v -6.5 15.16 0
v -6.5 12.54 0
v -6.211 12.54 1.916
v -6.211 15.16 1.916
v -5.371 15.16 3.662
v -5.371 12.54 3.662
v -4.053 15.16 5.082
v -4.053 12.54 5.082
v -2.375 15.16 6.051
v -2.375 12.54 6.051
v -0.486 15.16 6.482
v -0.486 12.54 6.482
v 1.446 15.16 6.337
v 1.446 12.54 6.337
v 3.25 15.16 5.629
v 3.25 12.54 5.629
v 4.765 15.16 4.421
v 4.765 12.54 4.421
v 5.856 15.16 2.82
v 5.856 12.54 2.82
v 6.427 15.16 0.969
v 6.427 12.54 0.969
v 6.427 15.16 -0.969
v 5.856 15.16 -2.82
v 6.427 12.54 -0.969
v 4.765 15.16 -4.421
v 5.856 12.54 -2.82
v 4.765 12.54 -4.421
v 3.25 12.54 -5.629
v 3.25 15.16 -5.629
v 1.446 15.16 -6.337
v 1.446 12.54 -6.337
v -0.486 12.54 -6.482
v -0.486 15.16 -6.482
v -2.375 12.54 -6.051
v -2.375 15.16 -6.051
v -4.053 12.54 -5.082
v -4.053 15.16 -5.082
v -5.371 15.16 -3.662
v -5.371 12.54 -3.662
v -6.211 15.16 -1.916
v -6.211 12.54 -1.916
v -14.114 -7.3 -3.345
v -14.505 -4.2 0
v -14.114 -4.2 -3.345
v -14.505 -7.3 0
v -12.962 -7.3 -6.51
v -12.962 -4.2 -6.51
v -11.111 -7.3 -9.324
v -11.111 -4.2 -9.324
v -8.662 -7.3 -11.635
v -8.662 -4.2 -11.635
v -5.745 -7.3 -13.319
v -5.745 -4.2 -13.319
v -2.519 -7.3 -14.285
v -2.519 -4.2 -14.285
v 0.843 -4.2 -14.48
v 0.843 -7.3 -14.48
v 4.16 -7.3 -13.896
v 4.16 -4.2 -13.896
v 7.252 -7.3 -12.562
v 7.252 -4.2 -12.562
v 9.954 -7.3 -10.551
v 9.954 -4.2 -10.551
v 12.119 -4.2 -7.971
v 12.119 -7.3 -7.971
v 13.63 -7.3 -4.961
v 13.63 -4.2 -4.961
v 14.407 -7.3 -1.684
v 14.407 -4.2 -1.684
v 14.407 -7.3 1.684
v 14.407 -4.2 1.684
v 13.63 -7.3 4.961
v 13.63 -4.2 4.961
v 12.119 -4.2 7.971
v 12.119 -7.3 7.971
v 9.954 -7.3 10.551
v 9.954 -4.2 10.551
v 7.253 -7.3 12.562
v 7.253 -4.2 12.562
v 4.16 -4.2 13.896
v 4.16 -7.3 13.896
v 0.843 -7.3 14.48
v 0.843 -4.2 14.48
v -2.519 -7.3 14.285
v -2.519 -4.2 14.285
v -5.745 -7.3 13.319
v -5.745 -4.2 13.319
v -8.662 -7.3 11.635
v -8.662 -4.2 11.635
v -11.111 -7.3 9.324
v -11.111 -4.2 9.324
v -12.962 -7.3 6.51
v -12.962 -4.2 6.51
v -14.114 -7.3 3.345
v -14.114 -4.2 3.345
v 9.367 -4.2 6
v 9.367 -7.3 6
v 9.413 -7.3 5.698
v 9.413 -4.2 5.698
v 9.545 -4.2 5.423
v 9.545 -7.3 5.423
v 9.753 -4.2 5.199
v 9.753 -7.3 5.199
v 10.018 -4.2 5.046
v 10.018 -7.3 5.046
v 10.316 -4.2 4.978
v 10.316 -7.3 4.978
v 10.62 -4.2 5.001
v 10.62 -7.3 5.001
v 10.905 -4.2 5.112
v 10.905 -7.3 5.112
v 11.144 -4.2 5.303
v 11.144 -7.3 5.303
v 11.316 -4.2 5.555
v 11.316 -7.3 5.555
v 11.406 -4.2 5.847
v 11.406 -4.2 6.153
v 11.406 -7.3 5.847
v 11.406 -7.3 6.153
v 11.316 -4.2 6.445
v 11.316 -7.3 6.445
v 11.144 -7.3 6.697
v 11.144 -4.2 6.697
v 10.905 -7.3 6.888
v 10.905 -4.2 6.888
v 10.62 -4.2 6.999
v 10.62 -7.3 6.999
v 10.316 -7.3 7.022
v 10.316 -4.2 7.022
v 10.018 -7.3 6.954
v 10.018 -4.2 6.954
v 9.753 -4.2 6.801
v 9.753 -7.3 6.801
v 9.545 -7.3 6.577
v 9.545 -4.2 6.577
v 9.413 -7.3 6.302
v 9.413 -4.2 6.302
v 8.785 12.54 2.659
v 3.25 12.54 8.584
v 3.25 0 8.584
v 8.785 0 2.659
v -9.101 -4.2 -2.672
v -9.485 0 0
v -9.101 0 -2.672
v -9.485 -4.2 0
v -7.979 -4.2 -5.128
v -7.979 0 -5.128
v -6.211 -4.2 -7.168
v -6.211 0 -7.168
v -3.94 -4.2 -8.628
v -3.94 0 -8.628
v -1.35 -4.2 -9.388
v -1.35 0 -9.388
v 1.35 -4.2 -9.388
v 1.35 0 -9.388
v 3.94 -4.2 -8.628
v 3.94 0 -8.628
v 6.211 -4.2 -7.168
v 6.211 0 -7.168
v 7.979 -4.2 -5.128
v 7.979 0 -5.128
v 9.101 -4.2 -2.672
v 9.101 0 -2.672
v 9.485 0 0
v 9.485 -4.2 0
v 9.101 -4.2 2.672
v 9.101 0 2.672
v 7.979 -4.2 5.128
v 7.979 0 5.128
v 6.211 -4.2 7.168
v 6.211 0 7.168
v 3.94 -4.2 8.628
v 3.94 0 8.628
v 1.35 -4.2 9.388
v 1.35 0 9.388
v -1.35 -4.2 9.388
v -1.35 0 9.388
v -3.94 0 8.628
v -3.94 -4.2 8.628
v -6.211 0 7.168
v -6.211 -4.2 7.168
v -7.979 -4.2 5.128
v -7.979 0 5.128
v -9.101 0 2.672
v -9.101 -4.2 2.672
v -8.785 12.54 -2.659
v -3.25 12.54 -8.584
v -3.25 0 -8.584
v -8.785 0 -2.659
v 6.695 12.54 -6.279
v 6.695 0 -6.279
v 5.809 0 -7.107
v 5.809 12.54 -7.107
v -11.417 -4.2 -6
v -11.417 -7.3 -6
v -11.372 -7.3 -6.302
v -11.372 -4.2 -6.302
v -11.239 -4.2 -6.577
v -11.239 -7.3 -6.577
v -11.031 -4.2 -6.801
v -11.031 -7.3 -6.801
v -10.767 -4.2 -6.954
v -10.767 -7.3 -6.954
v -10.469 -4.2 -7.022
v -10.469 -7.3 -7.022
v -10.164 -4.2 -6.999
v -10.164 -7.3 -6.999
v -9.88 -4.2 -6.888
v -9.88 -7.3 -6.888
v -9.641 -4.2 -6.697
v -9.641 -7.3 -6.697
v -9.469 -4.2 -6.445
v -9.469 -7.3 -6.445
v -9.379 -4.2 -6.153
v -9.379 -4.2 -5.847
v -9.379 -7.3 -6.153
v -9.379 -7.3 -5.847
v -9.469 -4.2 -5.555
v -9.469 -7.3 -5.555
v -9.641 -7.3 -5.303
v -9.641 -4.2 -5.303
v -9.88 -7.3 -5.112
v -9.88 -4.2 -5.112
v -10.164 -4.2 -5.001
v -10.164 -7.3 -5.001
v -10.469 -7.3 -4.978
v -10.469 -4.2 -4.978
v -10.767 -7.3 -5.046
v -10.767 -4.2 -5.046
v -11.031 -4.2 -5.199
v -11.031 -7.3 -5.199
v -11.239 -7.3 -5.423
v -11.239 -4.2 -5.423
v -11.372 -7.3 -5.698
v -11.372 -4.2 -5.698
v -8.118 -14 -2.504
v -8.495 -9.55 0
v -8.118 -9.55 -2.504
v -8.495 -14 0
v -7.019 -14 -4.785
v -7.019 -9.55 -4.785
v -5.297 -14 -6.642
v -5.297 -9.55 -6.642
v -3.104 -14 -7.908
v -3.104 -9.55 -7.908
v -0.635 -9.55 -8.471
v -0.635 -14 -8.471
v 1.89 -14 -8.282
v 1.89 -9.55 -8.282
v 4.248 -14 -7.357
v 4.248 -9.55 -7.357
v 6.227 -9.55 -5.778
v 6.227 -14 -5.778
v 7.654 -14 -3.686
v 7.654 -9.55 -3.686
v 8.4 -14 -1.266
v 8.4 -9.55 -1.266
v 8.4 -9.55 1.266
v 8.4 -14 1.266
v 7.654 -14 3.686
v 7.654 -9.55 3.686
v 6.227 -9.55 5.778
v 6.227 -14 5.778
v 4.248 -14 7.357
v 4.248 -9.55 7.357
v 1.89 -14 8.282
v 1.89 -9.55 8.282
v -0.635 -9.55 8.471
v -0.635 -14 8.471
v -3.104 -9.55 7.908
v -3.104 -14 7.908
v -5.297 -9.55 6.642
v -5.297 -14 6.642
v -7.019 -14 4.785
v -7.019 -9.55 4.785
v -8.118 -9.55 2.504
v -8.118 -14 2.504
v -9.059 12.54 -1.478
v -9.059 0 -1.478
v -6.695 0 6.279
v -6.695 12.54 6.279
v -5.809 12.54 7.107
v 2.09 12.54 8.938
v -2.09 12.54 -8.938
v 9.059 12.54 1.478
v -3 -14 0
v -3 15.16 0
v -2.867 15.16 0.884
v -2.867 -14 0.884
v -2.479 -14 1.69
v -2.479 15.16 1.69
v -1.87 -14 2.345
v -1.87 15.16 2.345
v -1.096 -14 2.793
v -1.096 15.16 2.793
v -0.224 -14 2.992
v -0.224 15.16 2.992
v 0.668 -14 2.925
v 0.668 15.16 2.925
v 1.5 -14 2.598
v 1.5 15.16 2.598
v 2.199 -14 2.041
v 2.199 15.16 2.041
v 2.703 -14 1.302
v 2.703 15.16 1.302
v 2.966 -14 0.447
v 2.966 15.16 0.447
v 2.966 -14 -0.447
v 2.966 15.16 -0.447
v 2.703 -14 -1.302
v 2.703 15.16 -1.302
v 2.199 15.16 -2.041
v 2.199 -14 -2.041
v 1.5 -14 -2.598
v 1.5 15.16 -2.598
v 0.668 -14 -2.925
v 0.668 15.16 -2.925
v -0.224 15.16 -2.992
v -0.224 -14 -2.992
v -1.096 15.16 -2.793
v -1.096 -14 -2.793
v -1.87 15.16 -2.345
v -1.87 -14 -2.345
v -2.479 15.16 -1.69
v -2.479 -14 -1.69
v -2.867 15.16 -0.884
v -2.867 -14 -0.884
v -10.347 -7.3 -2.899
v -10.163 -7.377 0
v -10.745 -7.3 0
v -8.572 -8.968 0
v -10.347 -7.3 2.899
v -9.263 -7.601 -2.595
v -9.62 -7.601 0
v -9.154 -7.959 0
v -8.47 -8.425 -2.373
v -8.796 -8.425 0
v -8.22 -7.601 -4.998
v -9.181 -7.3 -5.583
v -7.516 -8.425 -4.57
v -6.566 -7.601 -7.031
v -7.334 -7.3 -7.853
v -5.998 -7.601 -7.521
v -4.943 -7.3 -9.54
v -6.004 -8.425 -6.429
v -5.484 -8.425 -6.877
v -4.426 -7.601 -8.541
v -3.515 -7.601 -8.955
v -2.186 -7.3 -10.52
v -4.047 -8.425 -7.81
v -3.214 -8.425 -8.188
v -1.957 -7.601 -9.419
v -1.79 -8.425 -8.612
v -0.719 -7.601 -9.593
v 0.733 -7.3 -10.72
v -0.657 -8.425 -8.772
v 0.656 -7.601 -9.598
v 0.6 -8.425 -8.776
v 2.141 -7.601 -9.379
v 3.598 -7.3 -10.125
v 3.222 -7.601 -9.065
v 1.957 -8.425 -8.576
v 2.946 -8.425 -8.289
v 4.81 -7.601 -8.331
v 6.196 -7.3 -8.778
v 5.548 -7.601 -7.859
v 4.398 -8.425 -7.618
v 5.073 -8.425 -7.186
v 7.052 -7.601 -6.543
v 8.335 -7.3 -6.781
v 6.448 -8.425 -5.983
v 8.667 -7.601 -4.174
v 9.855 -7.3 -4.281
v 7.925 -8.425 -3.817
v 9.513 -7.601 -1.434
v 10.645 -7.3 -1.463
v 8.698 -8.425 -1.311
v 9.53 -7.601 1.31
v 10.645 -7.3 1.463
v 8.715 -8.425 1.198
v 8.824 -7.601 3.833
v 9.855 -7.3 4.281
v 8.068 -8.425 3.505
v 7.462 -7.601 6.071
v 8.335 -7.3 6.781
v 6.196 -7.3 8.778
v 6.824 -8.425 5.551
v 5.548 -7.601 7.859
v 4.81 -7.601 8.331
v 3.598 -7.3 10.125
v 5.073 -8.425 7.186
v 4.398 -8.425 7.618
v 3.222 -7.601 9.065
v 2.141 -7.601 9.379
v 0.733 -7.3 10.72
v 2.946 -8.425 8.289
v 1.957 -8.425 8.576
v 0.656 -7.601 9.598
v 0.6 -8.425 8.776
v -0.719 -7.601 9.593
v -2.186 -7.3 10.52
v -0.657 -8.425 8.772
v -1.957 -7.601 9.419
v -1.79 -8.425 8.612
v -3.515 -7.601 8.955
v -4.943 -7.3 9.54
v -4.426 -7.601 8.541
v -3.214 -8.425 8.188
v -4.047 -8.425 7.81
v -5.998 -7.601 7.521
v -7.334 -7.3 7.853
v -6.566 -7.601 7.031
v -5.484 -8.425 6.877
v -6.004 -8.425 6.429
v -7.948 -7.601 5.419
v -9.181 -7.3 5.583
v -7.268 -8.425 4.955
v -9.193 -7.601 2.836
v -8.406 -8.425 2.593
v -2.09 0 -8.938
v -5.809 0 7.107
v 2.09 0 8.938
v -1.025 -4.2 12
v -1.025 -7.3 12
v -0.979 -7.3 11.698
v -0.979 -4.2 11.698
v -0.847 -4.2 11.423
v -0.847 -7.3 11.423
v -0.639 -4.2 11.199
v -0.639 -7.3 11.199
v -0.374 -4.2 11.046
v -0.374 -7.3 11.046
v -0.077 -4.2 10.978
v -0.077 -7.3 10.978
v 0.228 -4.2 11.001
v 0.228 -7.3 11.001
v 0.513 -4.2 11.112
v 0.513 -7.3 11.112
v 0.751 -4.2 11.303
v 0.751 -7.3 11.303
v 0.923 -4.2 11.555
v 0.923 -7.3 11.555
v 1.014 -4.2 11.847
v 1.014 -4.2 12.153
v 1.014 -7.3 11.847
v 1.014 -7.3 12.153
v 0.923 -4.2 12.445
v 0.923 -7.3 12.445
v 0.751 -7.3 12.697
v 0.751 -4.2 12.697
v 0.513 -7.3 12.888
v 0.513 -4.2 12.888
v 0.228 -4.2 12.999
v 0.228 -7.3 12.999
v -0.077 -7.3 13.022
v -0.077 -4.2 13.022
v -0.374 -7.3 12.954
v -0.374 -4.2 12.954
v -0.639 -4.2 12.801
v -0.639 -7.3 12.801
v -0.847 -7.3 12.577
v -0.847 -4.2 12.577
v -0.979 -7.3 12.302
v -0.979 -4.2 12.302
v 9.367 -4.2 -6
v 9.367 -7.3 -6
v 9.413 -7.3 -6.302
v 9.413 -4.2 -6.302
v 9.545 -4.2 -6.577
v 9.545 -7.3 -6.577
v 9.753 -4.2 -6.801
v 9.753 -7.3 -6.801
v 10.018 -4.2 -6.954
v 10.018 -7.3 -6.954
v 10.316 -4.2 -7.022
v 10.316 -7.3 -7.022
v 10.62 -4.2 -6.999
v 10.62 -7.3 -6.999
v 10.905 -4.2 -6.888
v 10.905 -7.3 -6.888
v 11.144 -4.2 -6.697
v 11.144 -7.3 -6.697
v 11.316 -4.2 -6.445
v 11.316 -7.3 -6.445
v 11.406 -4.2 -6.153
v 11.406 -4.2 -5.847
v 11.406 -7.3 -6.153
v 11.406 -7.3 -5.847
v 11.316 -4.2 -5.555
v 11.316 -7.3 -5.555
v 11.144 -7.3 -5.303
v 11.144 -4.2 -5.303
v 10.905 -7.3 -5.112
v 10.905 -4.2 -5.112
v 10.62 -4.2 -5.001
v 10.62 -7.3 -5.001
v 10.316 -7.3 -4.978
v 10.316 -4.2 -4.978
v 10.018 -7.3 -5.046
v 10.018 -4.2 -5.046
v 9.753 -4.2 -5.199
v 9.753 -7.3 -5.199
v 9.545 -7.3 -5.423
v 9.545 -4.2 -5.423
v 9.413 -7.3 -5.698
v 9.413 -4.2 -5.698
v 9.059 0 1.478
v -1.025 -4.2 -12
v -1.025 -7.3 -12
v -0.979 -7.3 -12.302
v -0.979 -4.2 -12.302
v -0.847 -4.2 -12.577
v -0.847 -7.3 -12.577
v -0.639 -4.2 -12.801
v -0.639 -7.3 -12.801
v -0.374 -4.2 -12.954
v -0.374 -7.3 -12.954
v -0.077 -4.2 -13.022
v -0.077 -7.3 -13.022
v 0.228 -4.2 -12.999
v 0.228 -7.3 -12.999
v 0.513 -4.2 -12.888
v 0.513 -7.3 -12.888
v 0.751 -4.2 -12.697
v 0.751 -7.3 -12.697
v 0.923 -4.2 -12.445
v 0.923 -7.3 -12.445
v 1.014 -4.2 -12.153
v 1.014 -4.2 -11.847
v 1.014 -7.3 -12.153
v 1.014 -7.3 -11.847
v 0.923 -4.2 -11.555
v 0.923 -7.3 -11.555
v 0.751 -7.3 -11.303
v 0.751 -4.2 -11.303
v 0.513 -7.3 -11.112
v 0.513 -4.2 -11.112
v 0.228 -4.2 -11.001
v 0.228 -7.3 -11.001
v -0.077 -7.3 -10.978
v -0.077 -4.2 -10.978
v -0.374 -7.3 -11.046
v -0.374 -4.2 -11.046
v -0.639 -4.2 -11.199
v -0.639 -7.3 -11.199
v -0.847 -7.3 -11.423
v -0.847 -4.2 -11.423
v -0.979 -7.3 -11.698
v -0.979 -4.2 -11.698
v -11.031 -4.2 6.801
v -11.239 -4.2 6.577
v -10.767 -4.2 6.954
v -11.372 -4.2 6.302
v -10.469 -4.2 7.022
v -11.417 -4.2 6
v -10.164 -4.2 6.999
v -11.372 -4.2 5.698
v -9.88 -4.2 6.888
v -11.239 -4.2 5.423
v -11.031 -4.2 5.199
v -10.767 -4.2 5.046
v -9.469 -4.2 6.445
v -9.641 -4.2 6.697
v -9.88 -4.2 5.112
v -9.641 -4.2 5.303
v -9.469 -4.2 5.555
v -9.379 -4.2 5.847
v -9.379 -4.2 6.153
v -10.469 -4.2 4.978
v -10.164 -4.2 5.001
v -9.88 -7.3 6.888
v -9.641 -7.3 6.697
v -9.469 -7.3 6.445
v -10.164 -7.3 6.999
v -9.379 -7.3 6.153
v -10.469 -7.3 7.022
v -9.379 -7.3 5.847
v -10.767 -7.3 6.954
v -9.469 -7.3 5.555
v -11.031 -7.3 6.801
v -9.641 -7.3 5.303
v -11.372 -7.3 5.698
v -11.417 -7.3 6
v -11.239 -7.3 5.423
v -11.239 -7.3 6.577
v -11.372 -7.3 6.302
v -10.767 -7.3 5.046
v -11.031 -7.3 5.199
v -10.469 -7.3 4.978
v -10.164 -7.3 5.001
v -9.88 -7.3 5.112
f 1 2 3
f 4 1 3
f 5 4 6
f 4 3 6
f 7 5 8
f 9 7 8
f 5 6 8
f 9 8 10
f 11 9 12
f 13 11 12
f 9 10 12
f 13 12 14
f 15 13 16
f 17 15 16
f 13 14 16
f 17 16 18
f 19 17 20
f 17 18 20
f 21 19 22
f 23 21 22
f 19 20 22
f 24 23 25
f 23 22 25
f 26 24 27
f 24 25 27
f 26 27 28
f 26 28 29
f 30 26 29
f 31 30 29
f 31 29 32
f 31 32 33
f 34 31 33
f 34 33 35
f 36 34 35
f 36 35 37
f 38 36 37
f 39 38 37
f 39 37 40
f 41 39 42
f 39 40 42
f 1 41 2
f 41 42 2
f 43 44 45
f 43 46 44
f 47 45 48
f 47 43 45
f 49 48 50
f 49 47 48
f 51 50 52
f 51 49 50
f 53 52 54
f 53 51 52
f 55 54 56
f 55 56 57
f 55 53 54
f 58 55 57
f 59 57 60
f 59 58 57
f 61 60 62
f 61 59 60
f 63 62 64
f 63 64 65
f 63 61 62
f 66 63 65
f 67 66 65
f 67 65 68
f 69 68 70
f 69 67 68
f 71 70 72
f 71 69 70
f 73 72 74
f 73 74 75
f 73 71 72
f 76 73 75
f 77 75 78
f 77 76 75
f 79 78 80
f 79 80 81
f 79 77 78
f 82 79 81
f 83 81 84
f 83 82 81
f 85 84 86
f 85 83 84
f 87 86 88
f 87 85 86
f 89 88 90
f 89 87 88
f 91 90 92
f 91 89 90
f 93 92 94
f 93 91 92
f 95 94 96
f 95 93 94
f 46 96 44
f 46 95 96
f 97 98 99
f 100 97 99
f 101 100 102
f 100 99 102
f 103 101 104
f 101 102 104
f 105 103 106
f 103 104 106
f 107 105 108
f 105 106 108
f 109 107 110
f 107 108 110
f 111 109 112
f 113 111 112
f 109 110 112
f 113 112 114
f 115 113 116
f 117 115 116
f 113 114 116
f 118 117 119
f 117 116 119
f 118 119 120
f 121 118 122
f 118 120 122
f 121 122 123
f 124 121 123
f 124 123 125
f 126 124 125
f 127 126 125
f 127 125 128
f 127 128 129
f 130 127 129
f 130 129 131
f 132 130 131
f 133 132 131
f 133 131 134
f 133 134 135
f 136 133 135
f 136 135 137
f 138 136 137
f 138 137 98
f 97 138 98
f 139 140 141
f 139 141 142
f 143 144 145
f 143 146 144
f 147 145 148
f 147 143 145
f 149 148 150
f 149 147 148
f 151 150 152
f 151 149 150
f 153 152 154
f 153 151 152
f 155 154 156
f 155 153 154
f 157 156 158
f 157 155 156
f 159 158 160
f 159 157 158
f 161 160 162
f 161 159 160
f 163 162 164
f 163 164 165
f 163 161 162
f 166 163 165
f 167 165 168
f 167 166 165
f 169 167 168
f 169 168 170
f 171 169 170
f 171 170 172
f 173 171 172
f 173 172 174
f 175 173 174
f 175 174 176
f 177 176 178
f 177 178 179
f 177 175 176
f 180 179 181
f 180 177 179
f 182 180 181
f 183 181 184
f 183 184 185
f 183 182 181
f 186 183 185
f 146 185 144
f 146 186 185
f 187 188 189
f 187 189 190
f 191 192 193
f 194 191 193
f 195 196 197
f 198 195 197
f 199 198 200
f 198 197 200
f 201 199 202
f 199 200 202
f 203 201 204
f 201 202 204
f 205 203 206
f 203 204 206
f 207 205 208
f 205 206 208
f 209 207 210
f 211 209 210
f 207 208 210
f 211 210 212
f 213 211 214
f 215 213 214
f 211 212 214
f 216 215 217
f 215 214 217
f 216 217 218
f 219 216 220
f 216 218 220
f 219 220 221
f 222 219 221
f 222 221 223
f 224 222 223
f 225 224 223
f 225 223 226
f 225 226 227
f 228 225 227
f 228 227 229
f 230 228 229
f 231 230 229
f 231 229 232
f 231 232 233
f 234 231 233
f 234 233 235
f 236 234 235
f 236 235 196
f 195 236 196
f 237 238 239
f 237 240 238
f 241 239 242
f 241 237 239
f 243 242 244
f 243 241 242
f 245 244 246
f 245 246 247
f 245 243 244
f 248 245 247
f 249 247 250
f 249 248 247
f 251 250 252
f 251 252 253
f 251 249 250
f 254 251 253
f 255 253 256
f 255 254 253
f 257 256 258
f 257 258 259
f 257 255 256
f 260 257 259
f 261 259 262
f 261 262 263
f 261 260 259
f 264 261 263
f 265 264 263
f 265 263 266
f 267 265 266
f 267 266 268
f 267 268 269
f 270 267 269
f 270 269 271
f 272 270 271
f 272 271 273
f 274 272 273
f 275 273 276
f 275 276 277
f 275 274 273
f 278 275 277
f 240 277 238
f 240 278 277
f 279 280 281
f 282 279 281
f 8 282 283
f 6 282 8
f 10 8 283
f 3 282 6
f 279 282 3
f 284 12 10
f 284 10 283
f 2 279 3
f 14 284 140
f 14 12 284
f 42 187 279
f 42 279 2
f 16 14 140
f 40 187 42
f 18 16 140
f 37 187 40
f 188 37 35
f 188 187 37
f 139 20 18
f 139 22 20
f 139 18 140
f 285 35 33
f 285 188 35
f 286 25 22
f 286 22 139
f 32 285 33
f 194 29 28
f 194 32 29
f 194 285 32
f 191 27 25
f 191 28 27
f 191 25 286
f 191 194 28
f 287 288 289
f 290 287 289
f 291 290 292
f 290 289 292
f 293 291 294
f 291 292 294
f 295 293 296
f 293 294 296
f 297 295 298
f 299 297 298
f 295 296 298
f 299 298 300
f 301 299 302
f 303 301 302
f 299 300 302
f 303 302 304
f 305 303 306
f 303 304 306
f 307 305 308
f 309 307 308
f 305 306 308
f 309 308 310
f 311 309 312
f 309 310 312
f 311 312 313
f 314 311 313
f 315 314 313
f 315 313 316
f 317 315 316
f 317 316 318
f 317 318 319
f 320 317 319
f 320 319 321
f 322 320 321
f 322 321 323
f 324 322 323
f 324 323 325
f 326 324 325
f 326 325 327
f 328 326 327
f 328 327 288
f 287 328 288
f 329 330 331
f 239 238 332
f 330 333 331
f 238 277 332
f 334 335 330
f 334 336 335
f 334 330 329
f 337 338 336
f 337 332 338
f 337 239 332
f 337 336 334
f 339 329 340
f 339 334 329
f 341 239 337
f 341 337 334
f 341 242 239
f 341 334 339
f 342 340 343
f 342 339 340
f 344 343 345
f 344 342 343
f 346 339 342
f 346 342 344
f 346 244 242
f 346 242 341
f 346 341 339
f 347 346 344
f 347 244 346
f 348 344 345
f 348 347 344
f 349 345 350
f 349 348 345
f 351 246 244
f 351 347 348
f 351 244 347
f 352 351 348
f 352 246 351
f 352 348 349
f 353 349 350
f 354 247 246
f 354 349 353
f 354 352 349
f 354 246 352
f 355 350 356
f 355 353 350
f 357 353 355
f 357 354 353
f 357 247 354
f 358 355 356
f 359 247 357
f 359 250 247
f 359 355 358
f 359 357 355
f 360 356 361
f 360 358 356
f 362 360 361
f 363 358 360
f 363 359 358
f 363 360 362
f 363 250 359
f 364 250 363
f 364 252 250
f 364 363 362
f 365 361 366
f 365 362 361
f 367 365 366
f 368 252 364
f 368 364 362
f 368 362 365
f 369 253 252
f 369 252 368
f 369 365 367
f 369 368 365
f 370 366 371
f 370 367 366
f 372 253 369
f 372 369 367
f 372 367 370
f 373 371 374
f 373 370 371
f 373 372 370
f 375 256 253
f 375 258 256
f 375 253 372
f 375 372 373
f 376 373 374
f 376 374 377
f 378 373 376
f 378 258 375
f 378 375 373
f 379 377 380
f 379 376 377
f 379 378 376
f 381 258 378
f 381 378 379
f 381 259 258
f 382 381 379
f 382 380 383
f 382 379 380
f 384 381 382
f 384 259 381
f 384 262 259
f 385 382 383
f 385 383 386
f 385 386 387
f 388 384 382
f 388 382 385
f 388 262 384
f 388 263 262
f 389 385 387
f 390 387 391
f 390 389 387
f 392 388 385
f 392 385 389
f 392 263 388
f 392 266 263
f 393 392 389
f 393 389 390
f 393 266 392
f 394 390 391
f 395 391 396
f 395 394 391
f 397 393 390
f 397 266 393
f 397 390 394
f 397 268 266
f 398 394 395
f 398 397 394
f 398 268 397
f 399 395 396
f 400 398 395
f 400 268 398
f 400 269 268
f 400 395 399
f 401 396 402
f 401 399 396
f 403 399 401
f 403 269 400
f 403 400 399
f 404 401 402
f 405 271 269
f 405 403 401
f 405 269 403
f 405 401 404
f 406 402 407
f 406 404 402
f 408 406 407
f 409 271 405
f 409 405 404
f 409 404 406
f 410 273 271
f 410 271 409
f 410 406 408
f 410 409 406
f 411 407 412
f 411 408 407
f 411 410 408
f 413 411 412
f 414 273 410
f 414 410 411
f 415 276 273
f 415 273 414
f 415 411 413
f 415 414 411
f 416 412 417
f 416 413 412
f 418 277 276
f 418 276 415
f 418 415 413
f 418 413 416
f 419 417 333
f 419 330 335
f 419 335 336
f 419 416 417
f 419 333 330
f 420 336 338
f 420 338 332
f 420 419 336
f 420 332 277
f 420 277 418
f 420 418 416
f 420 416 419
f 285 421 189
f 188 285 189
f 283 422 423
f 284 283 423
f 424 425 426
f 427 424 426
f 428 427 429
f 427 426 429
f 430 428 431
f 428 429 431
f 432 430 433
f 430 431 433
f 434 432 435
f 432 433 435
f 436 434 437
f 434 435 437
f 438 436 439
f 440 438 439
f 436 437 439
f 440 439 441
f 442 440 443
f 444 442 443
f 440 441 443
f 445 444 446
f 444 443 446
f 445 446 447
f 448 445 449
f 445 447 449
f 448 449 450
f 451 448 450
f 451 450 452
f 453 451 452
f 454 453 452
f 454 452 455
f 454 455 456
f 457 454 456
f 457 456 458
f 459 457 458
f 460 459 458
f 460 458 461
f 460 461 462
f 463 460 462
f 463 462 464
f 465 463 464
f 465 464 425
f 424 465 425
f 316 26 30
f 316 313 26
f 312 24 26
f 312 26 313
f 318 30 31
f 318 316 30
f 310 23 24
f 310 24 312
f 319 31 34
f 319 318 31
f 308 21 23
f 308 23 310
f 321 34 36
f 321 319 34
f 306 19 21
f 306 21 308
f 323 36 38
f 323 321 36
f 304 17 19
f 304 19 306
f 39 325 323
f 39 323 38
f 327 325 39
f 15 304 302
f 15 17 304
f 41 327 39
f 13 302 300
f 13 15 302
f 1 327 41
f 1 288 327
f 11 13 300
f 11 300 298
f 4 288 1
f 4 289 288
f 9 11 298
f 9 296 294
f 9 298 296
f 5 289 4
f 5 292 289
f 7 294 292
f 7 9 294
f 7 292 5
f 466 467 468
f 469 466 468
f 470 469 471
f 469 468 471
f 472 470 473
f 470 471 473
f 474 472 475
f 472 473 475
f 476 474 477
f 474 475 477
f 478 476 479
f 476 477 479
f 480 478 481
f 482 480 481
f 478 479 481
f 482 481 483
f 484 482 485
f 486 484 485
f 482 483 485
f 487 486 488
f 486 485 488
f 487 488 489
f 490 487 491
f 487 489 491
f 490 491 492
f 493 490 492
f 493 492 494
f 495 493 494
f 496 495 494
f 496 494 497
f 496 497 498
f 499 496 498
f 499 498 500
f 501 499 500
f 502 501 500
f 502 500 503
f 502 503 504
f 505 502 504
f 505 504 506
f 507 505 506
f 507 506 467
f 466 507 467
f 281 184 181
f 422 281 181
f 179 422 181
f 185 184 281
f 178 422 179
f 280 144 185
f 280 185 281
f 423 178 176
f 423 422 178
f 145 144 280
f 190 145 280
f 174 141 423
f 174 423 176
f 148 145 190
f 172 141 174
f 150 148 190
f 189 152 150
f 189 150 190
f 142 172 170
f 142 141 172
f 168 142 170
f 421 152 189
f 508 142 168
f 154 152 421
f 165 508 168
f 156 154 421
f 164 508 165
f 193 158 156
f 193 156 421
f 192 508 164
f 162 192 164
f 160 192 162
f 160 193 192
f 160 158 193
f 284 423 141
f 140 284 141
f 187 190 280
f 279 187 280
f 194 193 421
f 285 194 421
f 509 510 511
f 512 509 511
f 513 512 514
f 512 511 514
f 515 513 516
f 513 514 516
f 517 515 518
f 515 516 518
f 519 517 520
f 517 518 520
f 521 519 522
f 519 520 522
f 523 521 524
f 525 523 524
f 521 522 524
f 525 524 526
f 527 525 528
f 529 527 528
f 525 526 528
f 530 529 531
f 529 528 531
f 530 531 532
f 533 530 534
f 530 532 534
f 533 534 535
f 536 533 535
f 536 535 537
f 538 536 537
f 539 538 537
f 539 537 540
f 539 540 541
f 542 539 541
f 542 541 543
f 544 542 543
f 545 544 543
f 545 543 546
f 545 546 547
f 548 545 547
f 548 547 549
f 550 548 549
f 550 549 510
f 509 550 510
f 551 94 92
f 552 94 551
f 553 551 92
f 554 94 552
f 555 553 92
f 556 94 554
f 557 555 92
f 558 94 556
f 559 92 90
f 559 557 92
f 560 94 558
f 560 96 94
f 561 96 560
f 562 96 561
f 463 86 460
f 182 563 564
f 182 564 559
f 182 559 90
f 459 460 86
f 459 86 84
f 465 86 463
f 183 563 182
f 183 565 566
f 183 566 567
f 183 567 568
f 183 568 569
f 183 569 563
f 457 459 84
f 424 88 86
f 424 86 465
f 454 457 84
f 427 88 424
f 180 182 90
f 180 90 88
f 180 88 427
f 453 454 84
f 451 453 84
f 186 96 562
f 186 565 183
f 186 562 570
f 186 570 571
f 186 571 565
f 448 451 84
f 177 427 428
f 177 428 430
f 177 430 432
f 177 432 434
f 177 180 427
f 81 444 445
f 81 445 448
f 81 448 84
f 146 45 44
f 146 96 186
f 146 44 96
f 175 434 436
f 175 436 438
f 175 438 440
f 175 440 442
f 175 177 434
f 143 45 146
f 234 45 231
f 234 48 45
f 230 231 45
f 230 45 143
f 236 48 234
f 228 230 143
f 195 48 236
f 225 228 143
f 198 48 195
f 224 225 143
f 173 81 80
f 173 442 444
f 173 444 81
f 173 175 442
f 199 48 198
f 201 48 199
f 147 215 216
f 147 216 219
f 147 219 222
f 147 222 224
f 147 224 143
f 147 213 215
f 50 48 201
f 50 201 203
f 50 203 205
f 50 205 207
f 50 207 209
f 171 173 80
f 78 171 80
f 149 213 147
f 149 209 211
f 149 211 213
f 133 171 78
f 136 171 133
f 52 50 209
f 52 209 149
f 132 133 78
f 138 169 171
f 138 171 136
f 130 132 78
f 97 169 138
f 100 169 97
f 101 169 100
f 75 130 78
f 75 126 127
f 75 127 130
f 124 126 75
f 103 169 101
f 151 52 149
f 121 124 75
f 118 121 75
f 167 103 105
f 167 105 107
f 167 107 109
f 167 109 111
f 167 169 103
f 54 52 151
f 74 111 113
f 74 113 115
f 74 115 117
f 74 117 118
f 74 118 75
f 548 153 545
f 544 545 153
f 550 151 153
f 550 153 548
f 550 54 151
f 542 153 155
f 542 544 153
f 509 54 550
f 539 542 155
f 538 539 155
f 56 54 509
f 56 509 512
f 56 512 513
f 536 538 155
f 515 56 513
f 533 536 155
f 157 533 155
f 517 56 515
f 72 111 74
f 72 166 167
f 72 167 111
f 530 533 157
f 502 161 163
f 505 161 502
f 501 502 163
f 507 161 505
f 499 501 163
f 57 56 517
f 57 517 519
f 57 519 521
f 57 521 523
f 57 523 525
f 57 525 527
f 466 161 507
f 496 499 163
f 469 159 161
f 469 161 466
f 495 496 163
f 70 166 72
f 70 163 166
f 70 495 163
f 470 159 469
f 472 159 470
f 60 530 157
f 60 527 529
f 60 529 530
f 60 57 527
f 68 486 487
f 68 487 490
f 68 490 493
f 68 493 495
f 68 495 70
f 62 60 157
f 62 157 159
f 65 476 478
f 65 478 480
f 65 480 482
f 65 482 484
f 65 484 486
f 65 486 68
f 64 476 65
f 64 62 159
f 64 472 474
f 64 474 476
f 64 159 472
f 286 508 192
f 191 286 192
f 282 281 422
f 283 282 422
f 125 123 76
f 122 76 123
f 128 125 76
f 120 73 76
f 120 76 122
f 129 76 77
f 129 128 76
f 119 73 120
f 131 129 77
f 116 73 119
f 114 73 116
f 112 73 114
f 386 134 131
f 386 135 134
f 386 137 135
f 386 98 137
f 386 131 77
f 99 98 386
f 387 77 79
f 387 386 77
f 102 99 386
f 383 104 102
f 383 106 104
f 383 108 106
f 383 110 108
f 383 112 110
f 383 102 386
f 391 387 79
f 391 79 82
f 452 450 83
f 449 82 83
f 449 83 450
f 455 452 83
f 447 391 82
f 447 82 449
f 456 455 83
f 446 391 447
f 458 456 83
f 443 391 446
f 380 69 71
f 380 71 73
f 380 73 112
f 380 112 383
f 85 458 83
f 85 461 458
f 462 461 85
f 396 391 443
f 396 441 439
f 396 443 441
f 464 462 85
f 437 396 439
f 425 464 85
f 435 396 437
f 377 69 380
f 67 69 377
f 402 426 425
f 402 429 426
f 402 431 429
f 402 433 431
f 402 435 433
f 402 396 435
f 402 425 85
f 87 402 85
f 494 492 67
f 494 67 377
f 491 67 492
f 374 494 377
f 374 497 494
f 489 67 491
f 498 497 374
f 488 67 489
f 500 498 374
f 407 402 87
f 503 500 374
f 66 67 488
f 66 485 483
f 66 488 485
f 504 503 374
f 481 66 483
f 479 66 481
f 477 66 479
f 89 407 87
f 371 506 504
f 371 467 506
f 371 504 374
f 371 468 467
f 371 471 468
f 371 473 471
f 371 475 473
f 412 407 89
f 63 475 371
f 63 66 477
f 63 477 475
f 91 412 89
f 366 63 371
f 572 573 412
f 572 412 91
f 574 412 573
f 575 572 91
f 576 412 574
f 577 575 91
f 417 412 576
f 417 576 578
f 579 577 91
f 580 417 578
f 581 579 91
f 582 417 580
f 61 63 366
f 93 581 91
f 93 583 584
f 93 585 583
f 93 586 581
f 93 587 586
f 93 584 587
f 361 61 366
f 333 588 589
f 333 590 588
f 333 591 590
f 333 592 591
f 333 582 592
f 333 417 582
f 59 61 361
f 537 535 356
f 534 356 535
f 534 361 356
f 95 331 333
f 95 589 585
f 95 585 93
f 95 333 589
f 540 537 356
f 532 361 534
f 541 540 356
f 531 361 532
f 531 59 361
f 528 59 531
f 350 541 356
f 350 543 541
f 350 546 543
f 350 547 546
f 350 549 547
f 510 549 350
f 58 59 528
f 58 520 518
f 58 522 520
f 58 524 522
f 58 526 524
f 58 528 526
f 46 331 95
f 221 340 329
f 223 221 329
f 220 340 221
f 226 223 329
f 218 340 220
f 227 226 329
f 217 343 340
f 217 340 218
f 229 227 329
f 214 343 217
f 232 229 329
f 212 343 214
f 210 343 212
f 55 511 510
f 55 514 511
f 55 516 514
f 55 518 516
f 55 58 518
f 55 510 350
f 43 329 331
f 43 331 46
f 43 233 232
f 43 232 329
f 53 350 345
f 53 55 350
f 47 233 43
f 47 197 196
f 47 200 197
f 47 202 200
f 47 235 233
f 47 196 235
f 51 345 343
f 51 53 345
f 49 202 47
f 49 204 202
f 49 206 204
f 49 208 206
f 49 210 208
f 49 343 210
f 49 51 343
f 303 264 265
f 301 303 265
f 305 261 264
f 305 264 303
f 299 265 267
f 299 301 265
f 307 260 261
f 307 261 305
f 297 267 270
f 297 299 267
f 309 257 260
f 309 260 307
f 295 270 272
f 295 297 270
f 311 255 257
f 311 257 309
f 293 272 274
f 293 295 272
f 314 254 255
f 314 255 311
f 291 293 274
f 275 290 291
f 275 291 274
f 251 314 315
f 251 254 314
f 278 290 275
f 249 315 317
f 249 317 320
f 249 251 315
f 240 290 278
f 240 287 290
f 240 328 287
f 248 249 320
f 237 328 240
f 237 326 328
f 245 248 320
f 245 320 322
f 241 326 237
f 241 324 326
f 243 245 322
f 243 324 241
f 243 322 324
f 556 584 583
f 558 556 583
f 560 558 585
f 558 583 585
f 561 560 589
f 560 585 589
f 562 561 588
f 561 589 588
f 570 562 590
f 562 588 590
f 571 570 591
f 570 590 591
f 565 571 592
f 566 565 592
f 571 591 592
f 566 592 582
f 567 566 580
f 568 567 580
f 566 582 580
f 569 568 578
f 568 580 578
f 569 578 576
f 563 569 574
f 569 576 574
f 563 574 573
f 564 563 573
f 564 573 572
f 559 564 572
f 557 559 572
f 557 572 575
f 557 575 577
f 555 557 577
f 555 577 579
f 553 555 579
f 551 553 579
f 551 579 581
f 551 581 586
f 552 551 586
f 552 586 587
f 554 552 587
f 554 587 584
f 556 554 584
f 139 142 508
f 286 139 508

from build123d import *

# Parameters (mm, degrees)
ESTRUSIONE_ESTRUSIONE1_DEPTH = 12.54
SCHIZZO3_R                   = 6.5
ESTRUSIONE_ESTRUSIONE2_DEPTH = 2.62
SCHIZZO4_R                   = 3
TAGLIO_ESTRUSIONE1_DEPTH     = 36.652428389
FORO_FILETTATO_M2_5X0_45_1_D = 2.05


with BuildPart() as part:
    # Schizzo1 → Rivoluzione1 (revolve)
    with BuildSketch(Plane.XY, mode=Mode.PRIVATE) as rivoluzione1_sk:
        with BuildLine():
            Line((0, 0), (9.485, 0))
            Line((9.485, 0), (9.485, -4.2))
            Line((9.485, -4.2), (14.505, -4.2))
            Line((14.505, -4.2), (14.505, -7.3))
            Line((14.505, -7.3), (10.745, -7.3))
            ThreePointArc((10.745, -7.3), (9.154009742, -7.959009742), (8.495, -9.55))
            Line((8.495, -9.55), (8.495, -14))
            Line((8.495, -14), (0, -14))
            Line((0, -14), (0, 0))
        make_face()
    revolve(rivoluzione1_sk.sketch.rotate(Axis((0, 0, 0), (0, -1, 0)), 180), axis=Axis((0, 0, 0), (0, -1, 0)))

    # Schizzo2 → Estrusione-Estrusione1 (add)
    with BuildSketch(Plane(origin=(0, 0, 0), x_dir=(1, 0, 0), z_dir=(0, 1, 0))):
        Polygon((2.090015263, -8.937889289), (3.249793028, -8.584455371), (8.785446812, -2.658938333), (9.059252943, -1.477824366), (6.695431549, 6.278950956), (5.809459915, 7.106631005), (-2.090015263, 8.937889289), (-3.249793028, 8.584455371), (-8.785446812, 2.658938333), (-9.059252943, 1.477824366), (-6.695431549, -6.278950956), (-5.809459915, -7.106631005), align=None)
    extrude(amount=ESTRUSIONE_ESTRUSIONE1_DEPTH)

    # Schizzo3 → Estrusione-Estrusione2 (add)
    with BuildSketch(Plane(origin=(0, 12.54, 0), x_dir=(1, 0, 0), z_dir=(0, 1, 0))):
        with Locations(Location((0, 0, 0), (0, 0, 180))):
            Circle(SCHIZZO3_R)
    extrude(amount=ESTRUSIONE_ESTRUSIONE2_DEPTH)

    # Schizzo4 → Taglio-Estrusione1 (cut, through all)
    with BuildSketch(Plane(origin=(0, 15.16, 0), x_dir=(1, 0, 0), z_dir=(0, 1, 0))):
        with Locations(Location((0, 0, 0), (0, 0, 180))):
            Circle(SCHIZZO4_R)
    extrude(amount=-TAGLIO_ESTRUSIONE1_DEPTH, mode=Mode.SUBTRACT)

    # Foro filettato M2.5x0.45-1 (through all)
    with Locations(Plane(origin=(0, -4.2, 0), x_dir=(1, 0, 0), z_dir=(0, 1, 0))):
        with Locations((0, -12), (-10.392304845, -6), (-10.392304845, 6), (0, 12), (10.392304845, 6), (10.392304845, -6), (0, 0)):
            Hole(FORO_FILETTATO_M2_5X0_45_1_D / 2)


solid = part.part
